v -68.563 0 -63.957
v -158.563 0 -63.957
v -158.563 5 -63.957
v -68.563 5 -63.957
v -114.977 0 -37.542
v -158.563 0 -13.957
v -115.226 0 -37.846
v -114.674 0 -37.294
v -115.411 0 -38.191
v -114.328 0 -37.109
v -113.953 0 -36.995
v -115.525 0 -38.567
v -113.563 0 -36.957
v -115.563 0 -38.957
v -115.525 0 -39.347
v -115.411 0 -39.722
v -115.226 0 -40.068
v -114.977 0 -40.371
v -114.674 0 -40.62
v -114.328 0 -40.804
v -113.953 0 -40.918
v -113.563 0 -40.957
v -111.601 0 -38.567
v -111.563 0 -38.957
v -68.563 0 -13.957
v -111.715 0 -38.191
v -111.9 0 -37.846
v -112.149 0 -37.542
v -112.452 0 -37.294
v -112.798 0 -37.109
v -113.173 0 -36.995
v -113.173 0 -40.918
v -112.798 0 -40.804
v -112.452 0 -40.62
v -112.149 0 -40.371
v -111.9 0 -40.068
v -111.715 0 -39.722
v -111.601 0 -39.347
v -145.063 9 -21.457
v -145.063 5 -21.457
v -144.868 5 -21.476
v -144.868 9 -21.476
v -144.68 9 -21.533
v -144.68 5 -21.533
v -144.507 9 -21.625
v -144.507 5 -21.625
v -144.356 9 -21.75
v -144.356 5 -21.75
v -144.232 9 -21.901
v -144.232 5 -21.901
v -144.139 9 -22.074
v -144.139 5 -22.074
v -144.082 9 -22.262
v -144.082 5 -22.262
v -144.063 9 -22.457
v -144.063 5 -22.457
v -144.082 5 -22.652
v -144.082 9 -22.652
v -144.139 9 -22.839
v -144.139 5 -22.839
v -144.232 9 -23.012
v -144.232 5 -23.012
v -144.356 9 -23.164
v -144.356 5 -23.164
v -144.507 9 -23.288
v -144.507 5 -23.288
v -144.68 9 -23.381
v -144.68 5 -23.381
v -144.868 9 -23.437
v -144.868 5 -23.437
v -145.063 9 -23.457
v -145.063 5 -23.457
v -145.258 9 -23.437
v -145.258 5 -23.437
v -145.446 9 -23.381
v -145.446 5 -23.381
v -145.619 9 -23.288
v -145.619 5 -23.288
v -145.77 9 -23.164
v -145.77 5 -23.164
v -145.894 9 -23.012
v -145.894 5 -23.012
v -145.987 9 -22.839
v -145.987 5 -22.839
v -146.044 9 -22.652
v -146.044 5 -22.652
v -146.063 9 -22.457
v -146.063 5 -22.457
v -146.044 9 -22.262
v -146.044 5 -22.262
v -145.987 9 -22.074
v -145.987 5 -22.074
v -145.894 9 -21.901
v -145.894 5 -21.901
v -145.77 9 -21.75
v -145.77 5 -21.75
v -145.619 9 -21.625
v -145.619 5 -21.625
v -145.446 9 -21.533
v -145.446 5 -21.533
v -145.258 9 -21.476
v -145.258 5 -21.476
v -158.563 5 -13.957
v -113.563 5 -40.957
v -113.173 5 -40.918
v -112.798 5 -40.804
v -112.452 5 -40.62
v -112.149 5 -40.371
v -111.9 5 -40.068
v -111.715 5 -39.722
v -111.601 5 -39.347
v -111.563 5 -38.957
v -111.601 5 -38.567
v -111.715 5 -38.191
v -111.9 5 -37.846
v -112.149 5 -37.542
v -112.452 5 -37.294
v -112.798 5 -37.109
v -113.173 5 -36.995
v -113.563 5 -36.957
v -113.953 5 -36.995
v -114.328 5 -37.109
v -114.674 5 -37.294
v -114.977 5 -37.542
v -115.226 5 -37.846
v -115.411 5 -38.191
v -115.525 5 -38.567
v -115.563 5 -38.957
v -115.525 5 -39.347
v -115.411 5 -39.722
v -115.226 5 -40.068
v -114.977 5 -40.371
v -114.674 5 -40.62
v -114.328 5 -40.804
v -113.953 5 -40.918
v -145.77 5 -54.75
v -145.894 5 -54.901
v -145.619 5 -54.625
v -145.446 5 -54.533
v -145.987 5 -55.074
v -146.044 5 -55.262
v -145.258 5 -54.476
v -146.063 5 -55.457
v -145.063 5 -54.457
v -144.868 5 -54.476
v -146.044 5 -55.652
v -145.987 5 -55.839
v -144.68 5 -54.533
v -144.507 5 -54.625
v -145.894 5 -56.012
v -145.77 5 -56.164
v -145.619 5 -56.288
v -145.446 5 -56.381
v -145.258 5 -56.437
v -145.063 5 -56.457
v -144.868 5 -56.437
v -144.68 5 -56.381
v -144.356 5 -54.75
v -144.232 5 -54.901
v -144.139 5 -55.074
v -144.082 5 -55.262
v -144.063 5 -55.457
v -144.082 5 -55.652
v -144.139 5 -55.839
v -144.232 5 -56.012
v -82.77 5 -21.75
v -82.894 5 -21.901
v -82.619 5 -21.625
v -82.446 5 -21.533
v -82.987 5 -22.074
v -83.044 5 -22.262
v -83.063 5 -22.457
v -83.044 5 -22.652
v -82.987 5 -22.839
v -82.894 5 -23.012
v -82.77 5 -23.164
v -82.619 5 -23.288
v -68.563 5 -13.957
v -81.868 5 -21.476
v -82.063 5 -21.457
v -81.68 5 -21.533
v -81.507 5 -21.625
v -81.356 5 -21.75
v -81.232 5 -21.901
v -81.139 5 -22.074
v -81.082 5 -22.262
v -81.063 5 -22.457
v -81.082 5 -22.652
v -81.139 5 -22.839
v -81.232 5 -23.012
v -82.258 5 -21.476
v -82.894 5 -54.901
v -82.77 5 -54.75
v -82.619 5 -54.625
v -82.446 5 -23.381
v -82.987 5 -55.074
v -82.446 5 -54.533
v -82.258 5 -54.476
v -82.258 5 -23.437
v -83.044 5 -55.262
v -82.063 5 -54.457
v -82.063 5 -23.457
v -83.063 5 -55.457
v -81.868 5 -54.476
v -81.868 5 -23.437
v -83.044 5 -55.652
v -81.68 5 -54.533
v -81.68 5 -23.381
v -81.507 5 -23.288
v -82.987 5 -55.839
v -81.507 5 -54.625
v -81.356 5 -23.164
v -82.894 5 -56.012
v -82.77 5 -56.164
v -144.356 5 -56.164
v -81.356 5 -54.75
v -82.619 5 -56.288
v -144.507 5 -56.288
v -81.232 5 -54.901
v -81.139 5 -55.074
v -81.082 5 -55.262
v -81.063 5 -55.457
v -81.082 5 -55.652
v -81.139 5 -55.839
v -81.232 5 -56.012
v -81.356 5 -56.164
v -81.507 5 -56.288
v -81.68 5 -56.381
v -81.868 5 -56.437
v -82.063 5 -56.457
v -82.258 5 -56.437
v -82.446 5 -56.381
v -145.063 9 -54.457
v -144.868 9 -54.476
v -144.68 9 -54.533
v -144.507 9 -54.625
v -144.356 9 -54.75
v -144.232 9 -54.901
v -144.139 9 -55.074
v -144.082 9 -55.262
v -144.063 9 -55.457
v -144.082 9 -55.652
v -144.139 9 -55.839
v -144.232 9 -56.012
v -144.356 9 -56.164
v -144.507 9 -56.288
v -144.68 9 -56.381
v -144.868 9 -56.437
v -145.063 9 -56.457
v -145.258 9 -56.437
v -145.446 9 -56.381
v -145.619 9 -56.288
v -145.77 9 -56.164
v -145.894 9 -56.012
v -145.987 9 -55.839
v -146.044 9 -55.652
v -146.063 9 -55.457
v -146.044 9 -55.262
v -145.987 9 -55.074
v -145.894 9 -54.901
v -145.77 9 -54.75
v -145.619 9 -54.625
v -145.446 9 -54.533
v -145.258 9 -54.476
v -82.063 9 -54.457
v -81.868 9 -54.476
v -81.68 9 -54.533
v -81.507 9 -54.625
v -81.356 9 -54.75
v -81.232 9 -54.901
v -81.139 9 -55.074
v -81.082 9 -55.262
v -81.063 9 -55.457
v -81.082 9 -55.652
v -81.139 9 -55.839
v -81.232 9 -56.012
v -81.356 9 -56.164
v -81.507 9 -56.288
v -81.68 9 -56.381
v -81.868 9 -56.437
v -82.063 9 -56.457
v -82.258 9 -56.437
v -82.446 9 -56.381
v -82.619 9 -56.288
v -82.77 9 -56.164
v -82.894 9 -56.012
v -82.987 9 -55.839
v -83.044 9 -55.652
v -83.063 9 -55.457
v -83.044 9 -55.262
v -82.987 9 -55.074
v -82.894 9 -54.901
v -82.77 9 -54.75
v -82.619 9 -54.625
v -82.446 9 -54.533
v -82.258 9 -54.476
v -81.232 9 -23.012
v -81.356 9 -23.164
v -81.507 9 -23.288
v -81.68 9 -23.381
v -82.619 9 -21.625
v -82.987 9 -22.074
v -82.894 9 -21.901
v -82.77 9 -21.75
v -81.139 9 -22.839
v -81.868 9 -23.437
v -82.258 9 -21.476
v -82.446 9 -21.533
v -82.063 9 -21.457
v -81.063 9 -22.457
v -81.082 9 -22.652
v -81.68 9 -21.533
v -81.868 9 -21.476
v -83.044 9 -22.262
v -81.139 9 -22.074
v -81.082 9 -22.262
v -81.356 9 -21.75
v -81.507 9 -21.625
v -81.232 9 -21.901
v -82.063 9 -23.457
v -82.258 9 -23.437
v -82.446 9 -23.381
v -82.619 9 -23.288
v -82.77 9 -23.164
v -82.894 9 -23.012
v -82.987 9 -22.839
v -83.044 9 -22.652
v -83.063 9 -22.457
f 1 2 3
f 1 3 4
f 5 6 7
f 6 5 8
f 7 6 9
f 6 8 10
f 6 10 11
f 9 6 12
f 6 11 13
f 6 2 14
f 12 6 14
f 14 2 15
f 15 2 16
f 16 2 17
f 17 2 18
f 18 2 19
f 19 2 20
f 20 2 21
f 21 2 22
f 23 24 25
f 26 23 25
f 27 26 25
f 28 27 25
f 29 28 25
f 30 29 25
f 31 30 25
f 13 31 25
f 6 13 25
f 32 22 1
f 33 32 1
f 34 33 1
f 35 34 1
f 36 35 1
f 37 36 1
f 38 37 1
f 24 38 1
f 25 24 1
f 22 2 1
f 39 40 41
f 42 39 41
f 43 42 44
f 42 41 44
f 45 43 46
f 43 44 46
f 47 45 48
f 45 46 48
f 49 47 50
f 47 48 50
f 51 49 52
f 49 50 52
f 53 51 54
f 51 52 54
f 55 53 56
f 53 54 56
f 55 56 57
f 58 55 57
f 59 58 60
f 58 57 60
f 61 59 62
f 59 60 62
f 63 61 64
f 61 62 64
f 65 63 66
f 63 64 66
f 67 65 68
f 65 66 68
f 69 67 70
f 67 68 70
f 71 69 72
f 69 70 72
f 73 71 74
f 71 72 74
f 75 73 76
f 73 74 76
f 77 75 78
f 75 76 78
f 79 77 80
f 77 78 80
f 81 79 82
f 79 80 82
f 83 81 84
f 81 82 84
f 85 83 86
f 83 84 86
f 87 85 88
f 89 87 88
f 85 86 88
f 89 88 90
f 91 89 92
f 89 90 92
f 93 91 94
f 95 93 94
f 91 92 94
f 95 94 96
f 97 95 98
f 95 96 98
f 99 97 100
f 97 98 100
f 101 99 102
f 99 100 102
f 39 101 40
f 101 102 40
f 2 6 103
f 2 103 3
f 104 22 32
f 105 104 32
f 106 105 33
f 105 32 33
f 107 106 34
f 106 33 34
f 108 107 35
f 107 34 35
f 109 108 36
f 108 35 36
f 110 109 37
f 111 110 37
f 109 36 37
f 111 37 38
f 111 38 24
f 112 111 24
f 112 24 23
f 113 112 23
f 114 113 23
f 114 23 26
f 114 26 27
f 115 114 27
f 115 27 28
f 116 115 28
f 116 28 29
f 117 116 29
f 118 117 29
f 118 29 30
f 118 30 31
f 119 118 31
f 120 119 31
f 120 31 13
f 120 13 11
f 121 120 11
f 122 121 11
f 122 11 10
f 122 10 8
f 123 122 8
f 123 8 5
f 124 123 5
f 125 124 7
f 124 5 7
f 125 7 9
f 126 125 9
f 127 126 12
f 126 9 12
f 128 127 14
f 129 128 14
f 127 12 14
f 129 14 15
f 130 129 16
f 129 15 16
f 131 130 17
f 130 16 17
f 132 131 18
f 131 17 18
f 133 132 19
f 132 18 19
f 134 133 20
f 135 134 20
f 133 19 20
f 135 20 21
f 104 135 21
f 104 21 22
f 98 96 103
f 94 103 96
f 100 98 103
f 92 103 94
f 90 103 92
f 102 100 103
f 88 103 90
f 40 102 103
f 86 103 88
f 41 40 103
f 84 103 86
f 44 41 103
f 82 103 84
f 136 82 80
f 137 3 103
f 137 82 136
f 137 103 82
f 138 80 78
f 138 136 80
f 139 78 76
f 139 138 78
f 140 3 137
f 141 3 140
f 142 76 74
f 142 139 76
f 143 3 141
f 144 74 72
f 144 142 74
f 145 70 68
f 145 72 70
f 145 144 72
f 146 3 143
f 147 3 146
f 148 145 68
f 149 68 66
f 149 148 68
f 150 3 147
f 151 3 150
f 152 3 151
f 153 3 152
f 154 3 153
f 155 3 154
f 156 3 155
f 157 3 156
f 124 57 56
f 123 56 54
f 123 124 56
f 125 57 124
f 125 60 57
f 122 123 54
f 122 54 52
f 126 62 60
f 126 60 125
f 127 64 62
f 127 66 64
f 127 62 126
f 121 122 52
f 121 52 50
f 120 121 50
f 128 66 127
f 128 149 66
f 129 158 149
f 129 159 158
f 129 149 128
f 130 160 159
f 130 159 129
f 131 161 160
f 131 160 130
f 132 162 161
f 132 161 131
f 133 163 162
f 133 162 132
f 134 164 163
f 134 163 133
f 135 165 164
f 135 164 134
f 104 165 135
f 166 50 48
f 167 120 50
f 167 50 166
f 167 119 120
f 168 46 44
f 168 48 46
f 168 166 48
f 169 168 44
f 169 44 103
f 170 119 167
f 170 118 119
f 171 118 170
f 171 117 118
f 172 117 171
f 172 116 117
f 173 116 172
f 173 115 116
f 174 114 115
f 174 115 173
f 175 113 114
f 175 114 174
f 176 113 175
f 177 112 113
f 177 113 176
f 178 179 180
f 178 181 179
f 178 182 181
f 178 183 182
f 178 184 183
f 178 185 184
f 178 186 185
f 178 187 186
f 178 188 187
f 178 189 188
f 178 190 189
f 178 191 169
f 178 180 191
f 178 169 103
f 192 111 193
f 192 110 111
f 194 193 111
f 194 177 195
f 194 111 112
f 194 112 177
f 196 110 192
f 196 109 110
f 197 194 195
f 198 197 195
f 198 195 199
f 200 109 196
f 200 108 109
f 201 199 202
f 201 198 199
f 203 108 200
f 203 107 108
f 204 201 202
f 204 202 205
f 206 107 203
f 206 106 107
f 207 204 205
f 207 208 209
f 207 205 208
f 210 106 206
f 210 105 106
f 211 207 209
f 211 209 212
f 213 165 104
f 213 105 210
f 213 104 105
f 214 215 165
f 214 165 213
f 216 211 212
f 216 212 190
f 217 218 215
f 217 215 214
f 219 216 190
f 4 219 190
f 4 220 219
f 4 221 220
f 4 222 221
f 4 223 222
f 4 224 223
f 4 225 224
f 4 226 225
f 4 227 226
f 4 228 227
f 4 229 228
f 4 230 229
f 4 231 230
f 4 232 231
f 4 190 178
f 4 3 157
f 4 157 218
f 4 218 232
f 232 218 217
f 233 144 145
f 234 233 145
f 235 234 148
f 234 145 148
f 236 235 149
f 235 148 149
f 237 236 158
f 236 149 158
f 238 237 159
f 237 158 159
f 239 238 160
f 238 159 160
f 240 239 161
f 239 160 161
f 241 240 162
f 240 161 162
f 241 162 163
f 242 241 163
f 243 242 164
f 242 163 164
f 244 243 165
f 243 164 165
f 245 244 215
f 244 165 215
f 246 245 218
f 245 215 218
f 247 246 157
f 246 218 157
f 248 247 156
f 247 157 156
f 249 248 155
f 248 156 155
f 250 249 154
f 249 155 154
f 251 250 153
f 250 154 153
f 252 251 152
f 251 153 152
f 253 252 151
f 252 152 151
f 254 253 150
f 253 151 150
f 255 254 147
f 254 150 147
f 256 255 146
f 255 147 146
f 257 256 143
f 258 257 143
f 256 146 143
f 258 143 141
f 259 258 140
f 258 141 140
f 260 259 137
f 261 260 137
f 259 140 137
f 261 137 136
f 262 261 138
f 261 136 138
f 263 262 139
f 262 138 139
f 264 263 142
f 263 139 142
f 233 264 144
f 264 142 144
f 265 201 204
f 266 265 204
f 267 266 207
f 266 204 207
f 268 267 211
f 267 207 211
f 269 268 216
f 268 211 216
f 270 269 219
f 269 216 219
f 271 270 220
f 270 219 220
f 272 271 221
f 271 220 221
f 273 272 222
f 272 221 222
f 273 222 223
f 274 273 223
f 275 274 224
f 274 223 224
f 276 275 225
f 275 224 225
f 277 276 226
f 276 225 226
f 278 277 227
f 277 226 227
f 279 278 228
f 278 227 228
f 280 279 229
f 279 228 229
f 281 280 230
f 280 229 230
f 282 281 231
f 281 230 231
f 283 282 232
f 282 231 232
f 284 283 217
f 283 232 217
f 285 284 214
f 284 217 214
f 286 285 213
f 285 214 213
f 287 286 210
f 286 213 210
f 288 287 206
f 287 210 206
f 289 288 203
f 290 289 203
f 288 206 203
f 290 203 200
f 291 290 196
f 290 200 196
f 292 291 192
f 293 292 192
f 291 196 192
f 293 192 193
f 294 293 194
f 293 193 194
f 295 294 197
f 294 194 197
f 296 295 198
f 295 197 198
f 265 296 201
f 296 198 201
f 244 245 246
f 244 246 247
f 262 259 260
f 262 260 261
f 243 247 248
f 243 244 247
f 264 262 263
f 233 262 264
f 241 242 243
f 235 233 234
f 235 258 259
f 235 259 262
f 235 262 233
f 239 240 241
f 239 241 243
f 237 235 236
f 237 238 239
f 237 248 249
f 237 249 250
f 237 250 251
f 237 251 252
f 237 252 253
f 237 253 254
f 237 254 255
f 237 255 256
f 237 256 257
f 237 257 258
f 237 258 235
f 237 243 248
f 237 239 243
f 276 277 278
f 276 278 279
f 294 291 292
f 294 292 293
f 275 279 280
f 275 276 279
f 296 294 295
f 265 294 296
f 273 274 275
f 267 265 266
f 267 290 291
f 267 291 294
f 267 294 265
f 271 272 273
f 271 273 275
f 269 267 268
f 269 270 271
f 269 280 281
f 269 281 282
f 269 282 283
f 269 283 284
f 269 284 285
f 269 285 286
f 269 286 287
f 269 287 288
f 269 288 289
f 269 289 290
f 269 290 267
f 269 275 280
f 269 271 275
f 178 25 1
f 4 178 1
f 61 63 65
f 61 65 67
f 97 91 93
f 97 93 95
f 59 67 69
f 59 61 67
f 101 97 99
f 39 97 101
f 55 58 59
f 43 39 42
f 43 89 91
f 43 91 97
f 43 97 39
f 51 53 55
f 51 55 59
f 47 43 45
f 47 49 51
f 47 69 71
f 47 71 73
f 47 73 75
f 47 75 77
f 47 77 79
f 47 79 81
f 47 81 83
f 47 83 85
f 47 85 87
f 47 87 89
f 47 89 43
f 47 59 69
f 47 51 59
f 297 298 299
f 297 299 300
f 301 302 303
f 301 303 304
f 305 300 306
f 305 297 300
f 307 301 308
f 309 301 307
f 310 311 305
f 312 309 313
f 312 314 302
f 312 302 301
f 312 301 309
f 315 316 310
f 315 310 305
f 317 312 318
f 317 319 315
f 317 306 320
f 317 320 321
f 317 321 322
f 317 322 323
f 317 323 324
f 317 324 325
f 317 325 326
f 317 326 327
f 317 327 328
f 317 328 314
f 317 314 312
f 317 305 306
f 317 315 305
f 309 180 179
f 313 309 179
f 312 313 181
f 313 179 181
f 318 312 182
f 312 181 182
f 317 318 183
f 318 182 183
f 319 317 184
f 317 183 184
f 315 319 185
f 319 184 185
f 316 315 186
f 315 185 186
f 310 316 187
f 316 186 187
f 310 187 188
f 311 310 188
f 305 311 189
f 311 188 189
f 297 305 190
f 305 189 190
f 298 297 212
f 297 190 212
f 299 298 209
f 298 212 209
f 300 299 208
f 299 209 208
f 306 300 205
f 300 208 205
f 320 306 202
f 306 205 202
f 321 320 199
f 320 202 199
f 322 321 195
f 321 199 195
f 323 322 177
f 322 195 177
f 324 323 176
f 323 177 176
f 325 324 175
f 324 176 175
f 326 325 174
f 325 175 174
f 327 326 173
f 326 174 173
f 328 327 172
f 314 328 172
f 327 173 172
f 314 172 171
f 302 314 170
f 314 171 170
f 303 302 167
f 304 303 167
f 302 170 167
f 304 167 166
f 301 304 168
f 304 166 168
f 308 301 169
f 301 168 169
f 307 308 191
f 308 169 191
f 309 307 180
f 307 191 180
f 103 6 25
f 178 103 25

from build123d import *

# Parameters (mm, degrees)
SKETCH2_W           = 90
SKETCH2_H           = 50
BOSS_EXTRUDE2_DEPTH = 5
SKETCH4_R           = 1
BOSS_EXTRUDE3_DEPTH = 4
SKETCH5_R           = 2
CUT_EXTRUDE1_DEPTH  = 18


with BuildPart() as part:
    # Sketch2 → Boss-Extrude2 (new body)
    with BuildSketch(Plane(origin=(0, 0, 0), x_dir=(1, 0, 0), z_dir=(0, 1, 0))):
        with Locations((-113.562992126, 38.956692913)):
            Rectangle(SKETCH2_W, SKETCH2_H)
    extrude(amount=BOSS_EXTRUDE2_DEPTH)

    # Sketch4 → Boss-Extrude3 (add)
    with BuildSketch(Plane(origin=(0, 5, 0), x_dir=(1, 0, 0), z_dir=(0, 1, 0))):
        with Locations(Location((-145.062992126, 22.456692913, 0), (0, 0, 270))):
            Circle(SKETCH4_R)
        with Locations(Location((-145.062992126, 55.456692913, 0), (0, 0, 270))):
            Circle(SKETCH4_R)
        with Locations(Location((-82.062992126, 55.456692913, 0), (0, 0, 270))):
            Circle(SKETCH4_R)
        with Locations(Location((-82.062992126, 22.456692913, 0), (0, 0, 270))):
            Circle(SKETCH4_R)
    extrude(amount=BOSS_EXTRUDE3_DEPTH)

    # Sketch5 → Cut-Extrude1 (cut)
    with BuildSketch(Plane.XZ):
        with Locations(Location((-113.562992126, -38.956692913, 0), (0, 0, 270))):
            Circle(SKETCH5_R)
    extrude(amount=-CUT_EXTRUDE1_DEPTH, mode=Mode.SUBTRACT)


solid = part.part
